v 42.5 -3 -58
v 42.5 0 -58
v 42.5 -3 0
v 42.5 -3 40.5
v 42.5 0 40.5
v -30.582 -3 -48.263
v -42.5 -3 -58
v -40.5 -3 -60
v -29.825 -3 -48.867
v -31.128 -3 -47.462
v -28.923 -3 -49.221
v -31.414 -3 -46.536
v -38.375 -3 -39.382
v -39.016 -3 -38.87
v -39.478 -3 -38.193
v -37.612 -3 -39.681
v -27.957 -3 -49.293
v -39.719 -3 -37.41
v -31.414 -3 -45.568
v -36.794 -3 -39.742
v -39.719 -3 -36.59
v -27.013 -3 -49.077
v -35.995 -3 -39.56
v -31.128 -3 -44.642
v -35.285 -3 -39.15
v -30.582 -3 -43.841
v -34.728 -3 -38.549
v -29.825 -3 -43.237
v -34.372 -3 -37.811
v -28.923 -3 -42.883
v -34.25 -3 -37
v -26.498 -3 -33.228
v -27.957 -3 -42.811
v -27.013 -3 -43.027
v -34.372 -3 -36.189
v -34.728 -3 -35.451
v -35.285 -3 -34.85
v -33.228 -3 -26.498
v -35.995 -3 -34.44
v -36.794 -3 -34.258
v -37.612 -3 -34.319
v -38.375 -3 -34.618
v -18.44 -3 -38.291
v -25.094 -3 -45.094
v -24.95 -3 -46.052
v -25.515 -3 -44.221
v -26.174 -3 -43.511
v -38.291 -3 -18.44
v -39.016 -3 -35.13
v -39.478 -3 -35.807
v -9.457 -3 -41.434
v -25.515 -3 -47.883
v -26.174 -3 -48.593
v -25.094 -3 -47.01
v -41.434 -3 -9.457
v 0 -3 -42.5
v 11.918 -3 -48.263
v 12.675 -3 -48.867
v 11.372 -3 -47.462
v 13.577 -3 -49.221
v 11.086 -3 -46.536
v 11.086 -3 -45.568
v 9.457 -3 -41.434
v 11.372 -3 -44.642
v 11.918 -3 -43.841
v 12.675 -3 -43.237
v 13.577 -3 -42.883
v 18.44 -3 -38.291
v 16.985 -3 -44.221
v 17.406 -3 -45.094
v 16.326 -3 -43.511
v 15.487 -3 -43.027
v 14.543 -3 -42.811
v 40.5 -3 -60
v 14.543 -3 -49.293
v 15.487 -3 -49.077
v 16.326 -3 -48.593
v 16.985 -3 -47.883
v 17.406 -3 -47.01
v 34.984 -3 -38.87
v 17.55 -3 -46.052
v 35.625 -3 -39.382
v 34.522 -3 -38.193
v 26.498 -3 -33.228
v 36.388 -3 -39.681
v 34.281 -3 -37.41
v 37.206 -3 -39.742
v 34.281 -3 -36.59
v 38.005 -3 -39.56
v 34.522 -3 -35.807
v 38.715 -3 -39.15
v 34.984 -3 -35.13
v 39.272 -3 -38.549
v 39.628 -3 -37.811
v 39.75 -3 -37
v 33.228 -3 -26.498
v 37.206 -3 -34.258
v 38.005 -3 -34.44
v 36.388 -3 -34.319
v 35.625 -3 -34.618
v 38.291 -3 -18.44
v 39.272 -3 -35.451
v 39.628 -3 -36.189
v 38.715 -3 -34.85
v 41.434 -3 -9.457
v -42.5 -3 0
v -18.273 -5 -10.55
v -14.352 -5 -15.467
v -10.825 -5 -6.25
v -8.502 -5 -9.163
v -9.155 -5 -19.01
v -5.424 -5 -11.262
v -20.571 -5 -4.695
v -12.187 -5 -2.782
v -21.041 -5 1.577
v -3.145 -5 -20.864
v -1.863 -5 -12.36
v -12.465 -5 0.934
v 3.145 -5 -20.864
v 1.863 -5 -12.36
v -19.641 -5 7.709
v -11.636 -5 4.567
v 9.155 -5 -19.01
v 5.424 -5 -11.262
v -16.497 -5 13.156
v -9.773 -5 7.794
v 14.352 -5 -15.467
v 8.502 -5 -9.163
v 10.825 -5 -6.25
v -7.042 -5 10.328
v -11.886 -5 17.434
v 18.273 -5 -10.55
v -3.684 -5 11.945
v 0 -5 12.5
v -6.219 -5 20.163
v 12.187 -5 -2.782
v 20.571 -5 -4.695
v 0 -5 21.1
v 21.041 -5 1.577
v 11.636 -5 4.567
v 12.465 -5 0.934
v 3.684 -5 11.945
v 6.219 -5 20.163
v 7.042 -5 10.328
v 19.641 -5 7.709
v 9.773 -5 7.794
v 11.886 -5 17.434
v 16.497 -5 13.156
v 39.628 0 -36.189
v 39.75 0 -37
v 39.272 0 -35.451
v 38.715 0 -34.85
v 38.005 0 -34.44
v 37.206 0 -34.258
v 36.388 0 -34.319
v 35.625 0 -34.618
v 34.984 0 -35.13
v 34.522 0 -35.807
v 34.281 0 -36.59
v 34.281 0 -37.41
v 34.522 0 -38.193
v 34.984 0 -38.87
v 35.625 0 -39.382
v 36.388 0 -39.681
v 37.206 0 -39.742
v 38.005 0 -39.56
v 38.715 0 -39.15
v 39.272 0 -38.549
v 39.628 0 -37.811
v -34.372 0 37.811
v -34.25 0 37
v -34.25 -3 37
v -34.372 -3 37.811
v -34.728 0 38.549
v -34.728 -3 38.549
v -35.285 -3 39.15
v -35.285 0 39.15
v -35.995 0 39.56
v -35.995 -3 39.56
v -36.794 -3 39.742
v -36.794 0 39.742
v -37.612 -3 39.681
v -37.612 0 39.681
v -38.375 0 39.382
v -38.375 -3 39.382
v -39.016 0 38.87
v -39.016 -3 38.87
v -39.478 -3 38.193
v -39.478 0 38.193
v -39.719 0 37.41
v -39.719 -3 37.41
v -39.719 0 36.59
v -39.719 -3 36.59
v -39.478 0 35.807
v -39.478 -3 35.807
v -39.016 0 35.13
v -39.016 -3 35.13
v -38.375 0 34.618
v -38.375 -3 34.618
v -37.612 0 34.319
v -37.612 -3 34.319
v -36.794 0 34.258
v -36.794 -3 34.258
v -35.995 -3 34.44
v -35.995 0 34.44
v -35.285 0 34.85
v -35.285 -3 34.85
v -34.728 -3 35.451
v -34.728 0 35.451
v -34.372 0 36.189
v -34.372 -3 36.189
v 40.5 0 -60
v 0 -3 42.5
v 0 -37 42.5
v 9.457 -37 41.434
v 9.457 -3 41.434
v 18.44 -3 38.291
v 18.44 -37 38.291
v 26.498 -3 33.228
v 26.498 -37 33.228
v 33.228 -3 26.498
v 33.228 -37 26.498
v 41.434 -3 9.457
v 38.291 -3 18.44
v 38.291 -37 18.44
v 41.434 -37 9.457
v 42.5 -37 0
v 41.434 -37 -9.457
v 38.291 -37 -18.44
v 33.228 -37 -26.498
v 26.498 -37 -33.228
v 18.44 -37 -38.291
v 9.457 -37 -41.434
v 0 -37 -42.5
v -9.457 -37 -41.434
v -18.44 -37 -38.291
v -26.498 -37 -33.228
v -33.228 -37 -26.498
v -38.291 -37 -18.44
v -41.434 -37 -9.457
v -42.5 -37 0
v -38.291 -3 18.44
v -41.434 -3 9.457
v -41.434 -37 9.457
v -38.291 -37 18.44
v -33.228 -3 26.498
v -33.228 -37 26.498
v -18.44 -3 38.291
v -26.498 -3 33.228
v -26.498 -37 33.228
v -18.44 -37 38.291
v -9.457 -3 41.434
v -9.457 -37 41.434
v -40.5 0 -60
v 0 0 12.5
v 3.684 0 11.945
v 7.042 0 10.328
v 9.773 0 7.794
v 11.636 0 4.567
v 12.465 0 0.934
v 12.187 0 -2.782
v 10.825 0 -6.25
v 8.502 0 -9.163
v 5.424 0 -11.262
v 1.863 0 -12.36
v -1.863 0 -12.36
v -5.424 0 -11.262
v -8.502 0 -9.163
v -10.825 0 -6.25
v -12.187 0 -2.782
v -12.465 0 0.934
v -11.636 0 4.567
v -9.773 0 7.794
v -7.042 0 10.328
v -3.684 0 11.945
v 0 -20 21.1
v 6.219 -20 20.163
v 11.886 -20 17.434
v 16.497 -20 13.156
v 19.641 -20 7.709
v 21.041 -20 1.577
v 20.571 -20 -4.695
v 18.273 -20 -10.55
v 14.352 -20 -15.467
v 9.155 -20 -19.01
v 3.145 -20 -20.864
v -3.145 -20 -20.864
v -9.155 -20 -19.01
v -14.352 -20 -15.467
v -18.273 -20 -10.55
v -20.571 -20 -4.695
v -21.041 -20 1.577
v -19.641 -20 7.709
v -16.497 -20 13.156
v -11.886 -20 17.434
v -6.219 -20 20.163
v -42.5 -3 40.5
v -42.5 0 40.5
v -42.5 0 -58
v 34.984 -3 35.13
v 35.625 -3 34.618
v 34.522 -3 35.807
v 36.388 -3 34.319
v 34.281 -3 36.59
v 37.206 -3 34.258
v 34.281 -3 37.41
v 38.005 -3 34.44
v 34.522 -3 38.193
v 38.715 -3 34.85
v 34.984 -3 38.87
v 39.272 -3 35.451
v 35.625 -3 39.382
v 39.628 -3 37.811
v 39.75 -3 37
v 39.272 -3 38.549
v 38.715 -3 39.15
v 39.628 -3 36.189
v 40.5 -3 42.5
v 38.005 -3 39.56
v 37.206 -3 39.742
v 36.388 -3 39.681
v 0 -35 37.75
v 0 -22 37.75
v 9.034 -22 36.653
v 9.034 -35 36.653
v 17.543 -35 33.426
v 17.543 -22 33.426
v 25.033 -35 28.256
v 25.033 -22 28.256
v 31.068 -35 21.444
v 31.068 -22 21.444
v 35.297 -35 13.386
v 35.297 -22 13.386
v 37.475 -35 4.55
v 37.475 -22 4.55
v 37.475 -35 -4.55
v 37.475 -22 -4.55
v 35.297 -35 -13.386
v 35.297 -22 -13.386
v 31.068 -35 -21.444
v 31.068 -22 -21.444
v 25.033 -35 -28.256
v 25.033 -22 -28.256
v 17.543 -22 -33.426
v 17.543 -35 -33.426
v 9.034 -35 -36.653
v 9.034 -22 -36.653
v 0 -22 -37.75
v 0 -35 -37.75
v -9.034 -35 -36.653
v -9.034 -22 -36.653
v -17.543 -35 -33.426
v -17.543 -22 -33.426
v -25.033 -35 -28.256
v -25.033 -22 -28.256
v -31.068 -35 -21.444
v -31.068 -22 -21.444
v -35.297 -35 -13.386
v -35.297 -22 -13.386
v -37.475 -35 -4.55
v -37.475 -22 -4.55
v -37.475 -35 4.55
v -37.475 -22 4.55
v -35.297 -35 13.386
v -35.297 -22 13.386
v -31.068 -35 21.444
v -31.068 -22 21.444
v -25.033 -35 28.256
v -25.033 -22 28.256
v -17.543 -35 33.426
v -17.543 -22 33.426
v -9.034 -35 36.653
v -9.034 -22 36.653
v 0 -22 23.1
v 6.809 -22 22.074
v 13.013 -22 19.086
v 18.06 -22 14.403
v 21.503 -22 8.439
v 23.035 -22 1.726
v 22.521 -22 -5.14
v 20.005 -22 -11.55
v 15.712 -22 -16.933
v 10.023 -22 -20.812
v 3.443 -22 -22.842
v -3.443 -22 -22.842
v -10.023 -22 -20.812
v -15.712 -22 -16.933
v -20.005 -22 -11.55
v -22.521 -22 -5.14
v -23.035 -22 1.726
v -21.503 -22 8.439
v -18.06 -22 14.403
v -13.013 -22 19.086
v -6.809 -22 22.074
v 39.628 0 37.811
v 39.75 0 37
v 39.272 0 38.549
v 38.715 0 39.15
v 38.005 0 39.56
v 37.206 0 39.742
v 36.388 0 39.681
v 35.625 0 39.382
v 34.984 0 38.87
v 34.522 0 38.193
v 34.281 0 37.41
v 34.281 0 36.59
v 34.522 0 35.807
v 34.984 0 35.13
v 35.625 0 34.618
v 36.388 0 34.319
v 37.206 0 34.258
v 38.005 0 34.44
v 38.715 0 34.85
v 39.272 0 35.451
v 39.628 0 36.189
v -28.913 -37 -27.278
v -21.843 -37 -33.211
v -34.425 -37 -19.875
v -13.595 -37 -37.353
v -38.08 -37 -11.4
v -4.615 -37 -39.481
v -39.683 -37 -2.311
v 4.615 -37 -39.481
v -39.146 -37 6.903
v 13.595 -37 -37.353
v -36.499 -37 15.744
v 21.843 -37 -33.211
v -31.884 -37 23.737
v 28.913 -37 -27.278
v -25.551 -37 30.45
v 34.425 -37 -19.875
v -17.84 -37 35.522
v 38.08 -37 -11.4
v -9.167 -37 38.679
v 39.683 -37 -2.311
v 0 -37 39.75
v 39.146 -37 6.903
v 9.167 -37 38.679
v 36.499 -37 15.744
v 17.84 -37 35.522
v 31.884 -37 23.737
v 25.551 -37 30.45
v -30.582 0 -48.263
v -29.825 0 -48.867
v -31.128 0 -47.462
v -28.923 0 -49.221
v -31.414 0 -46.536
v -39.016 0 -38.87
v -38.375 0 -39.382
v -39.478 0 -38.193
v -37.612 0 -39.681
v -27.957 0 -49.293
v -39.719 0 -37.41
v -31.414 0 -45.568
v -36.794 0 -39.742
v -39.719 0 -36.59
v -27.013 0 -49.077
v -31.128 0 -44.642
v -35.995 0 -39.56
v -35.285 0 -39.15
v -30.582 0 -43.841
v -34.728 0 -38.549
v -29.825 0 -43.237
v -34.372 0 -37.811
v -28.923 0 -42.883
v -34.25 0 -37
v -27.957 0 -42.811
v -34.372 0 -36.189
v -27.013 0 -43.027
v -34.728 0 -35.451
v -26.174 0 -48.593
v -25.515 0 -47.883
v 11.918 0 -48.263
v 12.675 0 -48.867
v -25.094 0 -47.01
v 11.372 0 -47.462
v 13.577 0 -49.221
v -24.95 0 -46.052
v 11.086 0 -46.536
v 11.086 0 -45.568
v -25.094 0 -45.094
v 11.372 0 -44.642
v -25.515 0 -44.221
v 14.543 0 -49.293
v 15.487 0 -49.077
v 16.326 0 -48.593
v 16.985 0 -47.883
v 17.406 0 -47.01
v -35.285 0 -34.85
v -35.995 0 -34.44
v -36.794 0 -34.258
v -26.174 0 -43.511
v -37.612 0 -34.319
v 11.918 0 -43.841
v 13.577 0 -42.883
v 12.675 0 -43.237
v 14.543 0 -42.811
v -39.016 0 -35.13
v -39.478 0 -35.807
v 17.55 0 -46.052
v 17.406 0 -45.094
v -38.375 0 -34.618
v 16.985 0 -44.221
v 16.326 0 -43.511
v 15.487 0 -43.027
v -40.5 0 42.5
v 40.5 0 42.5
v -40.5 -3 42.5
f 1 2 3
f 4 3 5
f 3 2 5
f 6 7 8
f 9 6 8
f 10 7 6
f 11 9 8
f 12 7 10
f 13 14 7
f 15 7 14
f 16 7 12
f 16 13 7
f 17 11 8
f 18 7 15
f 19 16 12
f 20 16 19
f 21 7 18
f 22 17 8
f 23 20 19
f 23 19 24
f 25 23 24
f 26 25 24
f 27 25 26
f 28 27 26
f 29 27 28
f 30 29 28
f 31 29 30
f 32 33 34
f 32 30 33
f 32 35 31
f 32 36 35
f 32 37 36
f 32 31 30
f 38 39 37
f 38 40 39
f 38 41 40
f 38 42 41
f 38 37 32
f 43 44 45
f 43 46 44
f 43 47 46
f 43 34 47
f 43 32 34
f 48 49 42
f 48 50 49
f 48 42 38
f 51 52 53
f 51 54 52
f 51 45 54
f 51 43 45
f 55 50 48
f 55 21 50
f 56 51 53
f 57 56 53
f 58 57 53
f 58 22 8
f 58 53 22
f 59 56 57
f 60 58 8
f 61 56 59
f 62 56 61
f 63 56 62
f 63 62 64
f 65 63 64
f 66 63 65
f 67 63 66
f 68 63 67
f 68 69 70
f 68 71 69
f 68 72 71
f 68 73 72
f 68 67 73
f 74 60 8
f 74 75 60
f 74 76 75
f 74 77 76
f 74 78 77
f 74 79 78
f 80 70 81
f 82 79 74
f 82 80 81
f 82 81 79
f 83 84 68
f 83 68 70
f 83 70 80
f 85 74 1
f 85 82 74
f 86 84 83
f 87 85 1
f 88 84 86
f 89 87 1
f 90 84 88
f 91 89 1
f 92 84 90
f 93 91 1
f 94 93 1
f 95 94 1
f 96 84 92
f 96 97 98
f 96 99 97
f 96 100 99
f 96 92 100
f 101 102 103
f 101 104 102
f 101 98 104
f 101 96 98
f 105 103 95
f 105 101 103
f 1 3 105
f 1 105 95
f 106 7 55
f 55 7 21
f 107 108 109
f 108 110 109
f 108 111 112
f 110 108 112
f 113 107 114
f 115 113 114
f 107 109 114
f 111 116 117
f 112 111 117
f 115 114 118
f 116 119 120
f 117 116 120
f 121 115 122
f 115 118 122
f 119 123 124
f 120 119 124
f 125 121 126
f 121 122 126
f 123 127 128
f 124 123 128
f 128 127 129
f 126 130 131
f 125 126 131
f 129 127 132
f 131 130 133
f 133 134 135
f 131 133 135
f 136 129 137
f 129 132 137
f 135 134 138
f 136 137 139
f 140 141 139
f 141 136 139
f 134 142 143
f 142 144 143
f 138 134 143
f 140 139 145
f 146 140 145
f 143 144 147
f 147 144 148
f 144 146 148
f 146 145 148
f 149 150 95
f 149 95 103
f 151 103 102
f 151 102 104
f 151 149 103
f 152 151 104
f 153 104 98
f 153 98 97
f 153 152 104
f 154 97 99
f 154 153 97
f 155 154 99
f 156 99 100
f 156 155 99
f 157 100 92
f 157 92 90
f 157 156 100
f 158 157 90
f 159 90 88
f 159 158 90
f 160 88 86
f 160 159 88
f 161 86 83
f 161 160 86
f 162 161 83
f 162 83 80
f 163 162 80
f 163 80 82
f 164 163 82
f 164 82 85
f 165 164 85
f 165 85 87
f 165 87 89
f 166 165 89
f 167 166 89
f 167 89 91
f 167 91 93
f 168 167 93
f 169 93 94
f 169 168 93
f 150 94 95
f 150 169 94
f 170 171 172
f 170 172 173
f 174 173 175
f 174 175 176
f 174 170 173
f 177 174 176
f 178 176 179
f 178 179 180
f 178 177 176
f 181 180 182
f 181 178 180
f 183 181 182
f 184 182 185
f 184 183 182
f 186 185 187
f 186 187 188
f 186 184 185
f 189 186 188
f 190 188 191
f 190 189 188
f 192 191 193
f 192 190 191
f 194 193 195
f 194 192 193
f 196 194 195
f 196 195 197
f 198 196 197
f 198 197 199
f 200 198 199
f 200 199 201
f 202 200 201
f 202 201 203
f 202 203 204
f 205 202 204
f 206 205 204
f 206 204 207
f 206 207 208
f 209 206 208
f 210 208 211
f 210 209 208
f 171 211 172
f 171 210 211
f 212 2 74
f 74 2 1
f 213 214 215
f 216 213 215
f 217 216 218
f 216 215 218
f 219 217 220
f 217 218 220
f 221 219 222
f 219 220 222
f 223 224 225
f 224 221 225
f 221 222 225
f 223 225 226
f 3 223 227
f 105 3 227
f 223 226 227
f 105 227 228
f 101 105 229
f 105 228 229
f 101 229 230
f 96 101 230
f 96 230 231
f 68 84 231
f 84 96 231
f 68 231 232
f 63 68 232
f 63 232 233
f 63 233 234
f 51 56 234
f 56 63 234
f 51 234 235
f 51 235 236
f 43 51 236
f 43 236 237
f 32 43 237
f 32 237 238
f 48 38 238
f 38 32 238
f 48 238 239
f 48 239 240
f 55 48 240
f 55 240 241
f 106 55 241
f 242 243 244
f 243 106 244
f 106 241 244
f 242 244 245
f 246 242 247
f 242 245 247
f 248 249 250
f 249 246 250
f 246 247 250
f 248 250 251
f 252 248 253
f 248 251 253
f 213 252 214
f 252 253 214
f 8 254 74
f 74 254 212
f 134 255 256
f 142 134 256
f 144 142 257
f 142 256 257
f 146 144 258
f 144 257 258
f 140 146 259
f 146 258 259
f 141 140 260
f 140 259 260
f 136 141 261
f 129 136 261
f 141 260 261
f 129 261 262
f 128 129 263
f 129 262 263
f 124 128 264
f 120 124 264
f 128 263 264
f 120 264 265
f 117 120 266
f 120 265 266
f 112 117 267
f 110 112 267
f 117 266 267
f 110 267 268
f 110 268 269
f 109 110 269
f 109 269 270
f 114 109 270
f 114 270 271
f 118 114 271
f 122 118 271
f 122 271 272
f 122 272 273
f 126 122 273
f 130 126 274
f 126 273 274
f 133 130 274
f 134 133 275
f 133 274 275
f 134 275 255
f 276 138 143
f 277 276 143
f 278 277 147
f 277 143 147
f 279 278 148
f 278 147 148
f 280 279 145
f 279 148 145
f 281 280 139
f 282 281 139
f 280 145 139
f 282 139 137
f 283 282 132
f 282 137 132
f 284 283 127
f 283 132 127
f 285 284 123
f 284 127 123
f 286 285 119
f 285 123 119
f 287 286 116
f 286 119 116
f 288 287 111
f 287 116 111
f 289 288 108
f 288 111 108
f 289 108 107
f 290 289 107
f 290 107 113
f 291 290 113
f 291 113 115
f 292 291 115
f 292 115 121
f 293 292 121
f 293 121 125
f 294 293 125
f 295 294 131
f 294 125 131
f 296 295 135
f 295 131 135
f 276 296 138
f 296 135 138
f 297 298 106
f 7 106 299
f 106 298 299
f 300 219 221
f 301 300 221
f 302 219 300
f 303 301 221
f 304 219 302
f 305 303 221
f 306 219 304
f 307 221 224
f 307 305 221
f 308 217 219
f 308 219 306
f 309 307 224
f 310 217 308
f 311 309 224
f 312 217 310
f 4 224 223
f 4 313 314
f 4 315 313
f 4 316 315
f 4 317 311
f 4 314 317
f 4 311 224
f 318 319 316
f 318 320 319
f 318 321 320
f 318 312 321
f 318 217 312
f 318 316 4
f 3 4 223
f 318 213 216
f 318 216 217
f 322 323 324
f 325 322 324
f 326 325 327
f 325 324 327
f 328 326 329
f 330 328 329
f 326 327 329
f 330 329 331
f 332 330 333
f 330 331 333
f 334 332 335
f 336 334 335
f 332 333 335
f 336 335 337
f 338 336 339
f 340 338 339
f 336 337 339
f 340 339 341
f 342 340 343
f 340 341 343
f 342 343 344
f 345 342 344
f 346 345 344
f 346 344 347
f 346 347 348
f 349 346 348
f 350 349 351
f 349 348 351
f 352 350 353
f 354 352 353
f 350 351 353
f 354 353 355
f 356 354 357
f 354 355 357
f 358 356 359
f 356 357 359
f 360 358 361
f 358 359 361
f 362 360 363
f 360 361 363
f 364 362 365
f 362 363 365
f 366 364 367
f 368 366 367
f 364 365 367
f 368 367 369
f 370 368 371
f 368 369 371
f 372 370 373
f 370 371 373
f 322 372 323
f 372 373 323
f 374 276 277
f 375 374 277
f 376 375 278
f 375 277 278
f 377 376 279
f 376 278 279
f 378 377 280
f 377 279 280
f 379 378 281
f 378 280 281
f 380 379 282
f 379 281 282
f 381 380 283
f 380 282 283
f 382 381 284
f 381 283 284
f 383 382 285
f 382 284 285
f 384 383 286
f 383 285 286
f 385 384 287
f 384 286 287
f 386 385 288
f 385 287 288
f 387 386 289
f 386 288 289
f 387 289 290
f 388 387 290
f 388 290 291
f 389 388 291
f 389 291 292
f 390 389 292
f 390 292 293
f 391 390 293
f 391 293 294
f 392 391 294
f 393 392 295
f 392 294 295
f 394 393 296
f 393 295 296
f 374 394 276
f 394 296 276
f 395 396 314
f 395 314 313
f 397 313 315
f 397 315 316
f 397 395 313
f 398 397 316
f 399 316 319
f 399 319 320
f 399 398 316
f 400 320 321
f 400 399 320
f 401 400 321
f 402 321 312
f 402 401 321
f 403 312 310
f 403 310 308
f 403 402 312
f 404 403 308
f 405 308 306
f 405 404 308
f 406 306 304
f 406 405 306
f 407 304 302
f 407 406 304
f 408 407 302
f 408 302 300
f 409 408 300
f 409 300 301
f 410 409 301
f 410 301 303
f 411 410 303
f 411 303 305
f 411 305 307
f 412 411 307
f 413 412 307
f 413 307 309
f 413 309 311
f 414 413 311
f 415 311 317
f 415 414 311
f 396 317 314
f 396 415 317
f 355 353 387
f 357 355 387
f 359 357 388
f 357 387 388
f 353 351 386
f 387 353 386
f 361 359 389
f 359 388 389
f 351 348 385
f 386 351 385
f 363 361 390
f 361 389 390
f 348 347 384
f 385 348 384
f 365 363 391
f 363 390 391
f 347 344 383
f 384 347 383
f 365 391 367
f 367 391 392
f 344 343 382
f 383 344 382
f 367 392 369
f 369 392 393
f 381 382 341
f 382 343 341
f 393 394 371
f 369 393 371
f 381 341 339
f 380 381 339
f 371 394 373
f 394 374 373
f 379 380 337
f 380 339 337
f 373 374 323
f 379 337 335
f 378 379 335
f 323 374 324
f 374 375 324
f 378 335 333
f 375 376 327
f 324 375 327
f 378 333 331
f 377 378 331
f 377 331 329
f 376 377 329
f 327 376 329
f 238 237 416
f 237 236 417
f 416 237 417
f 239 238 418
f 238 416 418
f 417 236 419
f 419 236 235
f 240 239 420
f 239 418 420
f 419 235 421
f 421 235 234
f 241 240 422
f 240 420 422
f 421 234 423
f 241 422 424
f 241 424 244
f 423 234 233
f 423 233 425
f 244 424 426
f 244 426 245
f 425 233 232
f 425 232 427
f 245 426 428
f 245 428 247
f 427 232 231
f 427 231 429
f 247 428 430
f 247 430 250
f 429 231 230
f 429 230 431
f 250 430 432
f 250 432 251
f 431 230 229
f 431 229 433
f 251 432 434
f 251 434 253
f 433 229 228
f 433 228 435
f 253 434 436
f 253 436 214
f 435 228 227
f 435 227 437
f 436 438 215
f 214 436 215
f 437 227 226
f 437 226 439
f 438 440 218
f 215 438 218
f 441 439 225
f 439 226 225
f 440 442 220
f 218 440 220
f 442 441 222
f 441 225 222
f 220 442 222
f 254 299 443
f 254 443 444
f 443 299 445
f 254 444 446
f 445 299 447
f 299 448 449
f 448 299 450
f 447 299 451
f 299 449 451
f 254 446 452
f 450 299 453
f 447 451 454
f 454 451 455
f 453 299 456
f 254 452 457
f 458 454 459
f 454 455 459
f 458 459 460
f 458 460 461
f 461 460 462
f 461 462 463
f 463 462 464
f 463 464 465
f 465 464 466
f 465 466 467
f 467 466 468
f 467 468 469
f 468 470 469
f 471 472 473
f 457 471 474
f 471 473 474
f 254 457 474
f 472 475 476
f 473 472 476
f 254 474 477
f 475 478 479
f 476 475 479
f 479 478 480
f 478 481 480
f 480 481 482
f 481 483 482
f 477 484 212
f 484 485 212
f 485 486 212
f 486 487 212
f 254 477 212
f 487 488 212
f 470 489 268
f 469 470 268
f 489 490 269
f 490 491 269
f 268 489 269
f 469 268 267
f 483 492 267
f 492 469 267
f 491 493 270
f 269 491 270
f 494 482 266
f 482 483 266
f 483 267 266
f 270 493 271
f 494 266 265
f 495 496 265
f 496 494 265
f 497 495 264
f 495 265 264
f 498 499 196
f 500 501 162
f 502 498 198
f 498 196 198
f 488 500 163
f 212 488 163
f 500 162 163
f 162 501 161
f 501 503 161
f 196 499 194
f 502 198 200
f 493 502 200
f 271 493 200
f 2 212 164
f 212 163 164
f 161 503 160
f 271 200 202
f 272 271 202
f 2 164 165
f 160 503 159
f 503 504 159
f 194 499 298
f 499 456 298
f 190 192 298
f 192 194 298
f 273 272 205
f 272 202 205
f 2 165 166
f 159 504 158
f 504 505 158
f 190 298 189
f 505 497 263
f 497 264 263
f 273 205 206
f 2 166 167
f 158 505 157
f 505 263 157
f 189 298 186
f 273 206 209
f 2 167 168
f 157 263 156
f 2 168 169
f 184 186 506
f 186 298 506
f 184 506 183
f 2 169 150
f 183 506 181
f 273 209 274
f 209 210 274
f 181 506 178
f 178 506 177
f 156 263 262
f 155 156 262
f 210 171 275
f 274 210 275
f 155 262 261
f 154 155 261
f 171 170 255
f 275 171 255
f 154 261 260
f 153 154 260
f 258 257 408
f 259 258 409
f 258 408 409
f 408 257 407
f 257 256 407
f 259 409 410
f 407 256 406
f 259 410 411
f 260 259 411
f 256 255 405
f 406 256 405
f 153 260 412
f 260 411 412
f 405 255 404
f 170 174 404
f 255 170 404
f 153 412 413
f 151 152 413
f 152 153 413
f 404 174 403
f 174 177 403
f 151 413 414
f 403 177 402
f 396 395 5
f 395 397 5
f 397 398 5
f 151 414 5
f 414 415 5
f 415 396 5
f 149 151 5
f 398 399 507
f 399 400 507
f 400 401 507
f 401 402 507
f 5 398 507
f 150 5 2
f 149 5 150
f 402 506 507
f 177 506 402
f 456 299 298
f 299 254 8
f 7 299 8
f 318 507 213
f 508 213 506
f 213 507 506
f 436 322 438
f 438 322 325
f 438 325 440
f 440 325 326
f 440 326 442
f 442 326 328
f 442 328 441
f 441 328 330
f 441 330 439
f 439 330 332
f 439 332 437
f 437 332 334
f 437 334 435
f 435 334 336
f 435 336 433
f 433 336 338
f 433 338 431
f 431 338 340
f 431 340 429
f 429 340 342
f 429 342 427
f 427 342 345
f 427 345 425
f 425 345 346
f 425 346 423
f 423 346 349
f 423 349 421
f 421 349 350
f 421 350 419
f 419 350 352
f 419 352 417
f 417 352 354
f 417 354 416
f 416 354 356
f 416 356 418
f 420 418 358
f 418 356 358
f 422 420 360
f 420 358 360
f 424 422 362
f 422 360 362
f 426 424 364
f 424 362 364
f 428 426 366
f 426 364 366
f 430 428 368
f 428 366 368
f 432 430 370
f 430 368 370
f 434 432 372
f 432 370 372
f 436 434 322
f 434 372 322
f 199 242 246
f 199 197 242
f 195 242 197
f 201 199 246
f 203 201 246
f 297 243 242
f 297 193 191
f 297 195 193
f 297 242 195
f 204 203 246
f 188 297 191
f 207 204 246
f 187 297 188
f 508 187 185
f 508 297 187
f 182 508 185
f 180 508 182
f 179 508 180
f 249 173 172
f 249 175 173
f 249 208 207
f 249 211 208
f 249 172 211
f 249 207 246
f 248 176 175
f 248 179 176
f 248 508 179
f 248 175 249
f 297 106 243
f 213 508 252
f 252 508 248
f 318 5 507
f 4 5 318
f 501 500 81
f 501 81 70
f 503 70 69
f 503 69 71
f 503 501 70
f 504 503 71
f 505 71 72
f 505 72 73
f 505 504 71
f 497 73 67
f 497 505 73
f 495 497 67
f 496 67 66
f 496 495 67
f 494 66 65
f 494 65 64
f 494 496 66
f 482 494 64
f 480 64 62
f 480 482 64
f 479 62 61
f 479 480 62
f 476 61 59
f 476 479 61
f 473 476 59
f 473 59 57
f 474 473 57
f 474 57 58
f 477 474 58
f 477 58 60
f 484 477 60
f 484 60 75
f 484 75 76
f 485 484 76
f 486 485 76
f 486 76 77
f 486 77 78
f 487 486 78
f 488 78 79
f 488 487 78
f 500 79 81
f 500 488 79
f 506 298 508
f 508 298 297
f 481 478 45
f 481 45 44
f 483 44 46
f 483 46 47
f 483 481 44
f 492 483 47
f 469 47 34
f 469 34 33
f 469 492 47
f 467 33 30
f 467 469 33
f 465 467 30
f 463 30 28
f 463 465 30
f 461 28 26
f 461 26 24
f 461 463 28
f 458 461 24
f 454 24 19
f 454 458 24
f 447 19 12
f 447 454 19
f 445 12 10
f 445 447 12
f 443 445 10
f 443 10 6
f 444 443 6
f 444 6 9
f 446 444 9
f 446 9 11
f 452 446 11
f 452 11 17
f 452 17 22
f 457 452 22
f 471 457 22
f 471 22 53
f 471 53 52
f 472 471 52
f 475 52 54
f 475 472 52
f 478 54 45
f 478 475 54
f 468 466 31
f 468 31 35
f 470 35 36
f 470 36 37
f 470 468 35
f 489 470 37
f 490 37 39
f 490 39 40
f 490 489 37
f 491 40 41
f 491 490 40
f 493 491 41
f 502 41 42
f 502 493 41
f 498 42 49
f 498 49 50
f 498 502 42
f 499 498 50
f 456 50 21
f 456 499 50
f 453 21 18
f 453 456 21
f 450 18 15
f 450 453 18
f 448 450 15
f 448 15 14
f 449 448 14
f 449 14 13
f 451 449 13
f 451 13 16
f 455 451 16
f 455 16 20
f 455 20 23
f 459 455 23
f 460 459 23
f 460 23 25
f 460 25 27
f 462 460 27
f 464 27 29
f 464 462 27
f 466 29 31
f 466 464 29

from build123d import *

# Parameters (mm, degrees)
F2_R     = 2.75
F2_R_2   = 3.25
F2_R_3   = 12.5
F3_DEPTH = 3
F4_SIZE  = 2


with BuildPart() as f1:
    # F0 (on Right) → F1 (revolve)
    with BuildSketch(Plane.YZ):
        Polygon((0, 12.5), (0, 42.5), (-37, 42.5), (-37, 37.75), (-22, 37.75), (-22, 21.1), (-5, 21.1), (-5, 12.5), align=None)
    revolve(axis=Axis((0, -4.4609829783, 0), (0, 1, 0)))

    # F2 (on Front) → F3 (join)
    with BuildSketch(Plane.XZ):
        Polygon((42.5, 0), (42.5, 42.5), (-42.5, 42.5), (-42.5, 0), (-42.5, -42.5), (-42.5, -60), (42.5, -60), (42.5, -42.5), align=None)
        with Locations((-37, -37)):
            Circle(F2_R, mode=Mode.SUBTRACT)
        with Locations((-28.2, -46.052)):
            Circle(F2_R_2, mode=Mode.SUBTRACT)
        with Locations((14.3, -46.052)):
            Circle(F2_R_2, mode=Mode.SUBTRACT)
        with Locations((37, -37)):
            Circle(F2_R, mode=Mode.SUBTRACT)
        with Locations((-37, 37)):
            Circle(F2_R, mode=Mode.SUBTRACT)
        Circle(F2_R_3, mode=Mode.SUBTRACT)
        with Locations((37, 37)):
            Circle(F2_R, mode=Mode.SUBTRACT)
    extrude(amount=F3_DEPTH)

    # F4
    f4_edges = [f1.edges().sort_by_distance(p)[0] for p in [
        (42.5, -1.5, 42.5),
        (-42.5, -1.5, 42.5),
        (42.5, -1.5, -60),
        (-42.5, -1.5, -60),
        (0, -22, -21.1),
        (0, -37, -37.75),
    ]]
    chamfer(f4_edges, length=F4_SIZE)


solid = f1.part
